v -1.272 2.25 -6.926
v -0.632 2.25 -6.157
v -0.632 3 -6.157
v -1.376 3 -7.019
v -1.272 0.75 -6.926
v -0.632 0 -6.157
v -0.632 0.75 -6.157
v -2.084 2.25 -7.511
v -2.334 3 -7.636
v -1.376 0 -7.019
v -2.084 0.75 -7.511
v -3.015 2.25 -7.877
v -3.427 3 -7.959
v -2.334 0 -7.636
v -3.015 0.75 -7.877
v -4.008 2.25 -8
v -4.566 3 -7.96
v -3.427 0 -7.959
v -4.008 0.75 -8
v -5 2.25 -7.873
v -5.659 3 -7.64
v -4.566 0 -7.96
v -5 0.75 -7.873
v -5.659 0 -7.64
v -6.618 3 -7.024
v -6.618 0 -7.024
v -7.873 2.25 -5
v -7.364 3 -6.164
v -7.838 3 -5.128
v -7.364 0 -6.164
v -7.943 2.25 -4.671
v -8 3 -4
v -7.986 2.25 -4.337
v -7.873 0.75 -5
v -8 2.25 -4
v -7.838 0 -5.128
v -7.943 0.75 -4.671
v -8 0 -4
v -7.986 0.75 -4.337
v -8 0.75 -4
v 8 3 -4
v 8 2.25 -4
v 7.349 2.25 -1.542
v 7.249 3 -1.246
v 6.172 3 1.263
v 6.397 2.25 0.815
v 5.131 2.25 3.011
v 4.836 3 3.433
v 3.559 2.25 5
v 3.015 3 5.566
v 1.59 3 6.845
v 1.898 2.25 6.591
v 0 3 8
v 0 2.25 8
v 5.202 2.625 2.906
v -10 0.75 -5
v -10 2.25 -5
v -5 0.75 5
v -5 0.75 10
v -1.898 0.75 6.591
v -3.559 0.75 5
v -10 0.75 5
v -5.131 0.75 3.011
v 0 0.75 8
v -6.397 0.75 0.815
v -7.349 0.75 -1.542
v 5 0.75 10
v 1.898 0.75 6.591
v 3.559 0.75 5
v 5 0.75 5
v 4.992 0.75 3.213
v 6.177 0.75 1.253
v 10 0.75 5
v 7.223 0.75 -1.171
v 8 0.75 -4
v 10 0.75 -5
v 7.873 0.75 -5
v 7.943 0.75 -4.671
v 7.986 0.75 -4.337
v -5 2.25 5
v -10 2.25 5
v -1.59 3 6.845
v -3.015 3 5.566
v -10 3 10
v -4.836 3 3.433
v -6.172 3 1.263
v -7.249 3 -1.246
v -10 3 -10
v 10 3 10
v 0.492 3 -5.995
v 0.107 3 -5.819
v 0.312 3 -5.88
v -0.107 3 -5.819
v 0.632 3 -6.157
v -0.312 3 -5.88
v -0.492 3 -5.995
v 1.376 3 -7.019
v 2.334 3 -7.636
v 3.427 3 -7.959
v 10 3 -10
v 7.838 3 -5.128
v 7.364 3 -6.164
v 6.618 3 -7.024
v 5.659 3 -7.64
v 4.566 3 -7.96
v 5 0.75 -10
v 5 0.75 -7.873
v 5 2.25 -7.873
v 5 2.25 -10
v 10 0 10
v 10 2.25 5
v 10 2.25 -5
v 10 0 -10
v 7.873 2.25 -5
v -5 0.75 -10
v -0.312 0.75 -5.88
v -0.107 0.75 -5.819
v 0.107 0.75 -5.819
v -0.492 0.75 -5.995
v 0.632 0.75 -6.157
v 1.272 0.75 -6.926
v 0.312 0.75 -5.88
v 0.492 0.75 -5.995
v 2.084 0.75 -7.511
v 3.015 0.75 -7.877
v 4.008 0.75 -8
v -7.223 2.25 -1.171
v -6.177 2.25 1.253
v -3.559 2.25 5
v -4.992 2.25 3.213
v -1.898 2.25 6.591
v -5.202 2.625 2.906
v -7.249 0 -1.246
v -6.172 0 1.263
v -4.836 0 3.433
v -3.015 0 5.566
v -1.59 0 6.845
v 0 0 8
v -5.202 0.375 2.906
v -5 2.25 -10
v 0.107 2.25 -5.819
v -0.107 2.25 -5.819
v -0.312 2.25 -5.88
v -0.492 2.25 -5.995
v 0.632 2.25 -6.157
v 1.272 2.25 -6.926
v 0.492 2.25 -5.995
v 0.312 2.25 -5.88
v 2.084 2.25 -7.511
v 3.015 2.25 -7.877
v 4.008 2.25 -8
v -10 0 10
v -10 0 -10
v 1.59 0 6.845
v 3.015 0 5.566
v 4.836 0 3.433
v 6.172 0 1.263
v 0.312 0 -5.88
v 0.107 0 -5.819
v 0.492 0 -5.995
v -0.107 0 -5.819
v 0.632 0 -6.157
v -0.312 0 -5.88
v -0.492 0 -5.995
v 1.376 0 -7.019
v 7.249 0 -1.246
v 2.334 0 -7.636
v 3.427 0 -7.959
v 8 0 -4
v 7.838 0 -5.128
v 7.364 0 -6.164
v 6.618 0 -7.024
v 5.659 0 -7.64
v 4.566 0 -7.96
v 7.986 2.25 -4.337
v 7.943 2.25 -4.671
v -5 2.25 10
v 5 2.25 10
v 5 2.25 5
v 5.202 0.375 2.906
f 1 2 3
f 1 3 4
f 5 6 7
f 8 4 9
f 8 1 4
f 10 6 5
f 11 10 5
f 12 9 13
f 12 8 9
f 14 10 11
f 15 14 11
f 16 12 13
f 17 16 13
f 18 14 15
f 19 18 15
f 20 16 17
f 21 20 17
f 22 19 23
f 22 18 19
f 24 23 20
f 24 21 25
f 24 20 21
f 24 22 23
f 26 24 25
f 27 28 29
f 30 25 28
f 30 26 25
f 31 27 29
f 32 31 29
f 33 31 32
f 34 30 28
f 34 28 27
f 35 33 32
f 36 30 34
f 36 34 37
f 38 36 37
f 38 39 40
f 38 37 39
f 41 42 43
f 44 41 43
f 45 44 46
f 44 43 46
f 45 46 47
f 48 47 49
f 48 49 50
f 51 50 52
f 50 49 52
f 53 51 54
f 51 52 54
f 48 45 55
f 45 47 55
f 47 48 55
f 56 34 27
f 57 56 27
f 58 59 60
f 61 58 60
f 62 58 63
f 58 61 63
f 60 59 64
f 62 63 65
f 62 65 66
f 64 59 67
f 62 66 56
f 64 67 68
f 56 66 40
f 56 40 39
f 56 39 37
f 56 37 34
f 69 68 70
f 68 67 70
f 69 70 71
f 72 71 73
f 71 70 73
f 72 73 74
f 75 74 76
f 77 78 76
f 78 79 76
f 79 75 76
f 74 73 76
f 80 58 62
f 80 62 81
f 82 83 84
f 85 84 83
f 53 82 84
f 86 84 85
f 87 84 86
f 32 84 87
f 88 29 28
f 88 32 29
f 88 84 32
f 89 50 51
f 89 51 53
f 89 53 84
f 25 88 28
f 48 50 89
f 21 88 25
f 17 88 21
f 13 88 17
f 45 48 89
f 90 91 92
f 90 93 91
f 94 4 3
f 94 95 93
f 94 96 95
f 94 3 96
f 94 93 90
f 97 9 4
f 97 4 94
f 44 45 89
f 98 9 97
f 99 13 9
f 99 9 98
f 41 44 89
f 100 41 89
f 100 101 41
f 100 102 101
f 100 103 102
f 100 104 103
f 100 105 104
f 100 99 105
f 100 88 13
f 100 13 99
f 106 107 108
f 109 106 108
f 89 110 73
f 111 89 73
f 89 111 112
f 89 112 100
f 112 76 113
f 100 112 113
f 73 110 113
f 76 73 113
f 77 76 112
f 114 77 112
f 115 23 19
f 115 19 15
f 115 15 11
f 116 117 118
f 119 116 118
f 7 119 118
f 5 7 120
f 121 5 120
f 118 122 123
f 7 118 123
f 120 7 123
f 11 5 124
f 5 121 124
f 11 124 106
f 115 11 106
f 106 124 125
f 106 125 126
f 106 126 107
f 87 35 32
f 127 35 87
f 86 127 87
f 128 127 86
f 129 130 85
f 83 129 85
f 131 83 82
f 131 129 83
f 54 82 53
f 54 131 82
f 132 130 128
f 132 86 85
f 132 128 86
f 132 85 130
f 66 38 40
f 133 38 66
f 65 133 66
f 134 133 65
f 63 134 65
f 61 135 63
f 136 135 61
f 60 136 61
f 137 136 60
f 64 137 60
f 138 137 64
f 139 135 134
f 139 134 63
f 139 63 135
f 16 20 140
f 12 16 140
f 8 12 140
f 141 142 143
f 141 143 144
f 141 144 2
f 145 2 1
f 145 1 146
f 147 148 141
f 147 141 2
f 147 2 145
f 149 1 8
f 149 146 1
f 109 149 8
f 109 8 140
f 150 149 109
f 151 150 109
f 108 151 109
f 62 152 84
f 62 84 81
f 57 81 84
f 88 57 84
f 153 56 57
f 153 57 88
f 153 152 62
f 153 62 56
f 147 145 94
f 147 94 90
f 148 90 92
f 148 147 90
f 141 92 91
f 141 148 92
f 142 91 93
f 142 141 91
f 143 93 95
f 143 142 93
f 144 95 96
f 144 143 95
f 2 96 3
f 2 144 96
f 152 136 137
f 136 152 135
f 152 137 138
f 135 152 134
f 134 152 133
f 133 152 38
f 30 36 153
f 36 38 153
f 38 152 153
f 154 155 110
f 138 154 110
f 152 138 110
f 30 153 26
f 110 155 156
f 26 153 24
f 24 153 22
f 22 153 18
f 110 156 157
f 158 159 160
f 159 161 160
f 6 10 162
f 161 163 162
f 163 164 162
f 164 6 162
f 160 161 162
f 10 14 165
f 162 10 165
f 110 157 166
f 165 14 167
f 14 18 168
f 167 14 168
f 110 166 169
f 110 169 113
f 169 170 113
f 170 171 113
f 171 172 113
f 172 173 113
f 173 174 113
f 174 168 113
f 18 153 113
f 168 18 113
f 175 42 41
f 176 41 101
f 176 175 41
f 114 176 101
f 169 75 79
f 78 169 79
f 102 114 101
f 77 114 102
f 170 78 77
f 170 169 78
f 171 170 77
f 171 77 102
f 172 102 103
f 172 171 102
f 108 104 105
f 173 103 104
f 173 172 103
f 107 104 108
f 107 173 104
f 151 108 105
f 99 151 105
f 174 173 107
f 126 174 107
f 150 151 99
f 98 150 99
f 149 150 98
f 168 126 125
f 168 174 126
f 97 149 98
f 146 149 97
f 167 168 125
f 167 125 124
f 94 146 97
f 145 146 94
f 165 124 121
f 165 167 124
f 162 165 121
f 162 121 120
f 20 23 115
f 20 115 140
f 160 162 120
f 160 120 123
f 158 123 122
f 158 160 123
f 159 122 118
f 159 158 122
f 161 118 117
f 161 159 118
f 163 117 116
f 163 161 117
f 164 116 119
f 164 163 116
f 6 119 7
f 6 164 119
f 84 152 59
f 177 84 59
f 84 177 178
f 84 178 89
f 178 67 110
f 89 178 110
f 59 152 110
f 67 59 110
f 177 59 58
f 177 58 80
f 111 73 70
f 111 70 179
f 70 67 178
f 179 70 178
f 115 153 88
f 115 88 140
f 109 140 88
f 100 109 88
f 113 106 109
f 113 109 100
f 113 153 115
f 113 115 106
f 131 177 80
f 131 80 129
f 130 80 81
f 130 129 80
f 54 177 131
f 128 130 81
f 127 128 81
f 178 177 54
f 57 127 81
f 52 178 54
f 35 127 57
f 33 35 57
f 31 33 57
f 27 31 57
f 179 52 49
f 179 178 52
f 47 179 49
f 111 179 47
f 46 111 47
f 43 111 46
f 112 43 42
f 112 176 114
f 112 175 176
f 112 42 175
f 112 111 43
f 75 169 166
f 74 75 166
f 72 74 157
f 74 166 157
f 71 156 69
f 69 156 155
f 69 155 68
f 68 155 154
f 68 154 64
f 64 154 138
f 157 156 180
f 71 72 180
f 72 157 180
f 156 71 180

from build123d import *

# Parameters (mm, degrees)
SKETCH1_W           = 20
SKETCH1_H           = 20
BOSS_EXTRUDE1_DEPTH = 3
SKETCH2_W           = 10
SKETCH2_H           = 1.5
CUT_EXTRUDE1_DEPTH  = 21.0000001
SKETCH3_W           = 10
SKETCH3_H           = 1.5
CUT_EXTRUDE2_DEPTH  = 21.0000001


with BuildPart() as part:
    # Sketch1 → Boss-Extrude1 (new body)
    with BuildSketch(Plane(origin=(0, 0, 0), x_dir=(1, 0, 0), z_dir=(0, 1, 0))):
        Rectangle(SKETCH1_W, SKETCH1_H)
        with BuildLine():
            ThreePointArc((-0.631578947, 6.157252793), (-5.123902974, 7.83885948), (-8, 4))
            add(Edge.make_bspline(
                [(-8, 4), (-6.403336947, -3.811544104), (0, -8)],
                knots=[0, 0, 0, 1, 1, 1], degree=2))
            add(Edge.make_bspline(
                [(8, 4), (6.403336947, -3.811544104), (0, -8)],
                knots=[0, 0, 0, 1, 1, 1], degree=2))
            ThreePointArc((8, 4), (5.123902974, 7.83885948), (0.631578947, 6.157252793))
            ThreePointArc((0.631578947, 6.157252793), (0, 5.811737691), (-0.631578947, 6.157252793))
        make_face(mode=Mode.SUBTRACT)
    extrude(amount=BOSS_EXTRUDE1_DEPTH)

    # Sketch2 → Cut-Extrude1 (cut, through all)
    with BuildSketch(Plane(origin=(10, 0, 0), x_dir=(0, 0, -1), z_dir=(1, 0, 0))):
        with Locations((0, 1.5)):
            Rectangle(SKETCH2_W, SKETCH2_H)
    extrude(amount=-CUT_EXTRUDE1_DEPTH, mode=Mode.SUBTRACT)

    # Sketch3 → Cut-Extrude2 (cut, through all)
    with BuildSketch(Plane.XY.offset(10)):
        with Locations((0, 1.5)):
            Rectangle(SKETCH3_W, SKETCH3_H)
    extrude(amount=-CUT_EXTRUDE2_DEPTH, mode=Mode.SUBTRACT)


solid = part.part
